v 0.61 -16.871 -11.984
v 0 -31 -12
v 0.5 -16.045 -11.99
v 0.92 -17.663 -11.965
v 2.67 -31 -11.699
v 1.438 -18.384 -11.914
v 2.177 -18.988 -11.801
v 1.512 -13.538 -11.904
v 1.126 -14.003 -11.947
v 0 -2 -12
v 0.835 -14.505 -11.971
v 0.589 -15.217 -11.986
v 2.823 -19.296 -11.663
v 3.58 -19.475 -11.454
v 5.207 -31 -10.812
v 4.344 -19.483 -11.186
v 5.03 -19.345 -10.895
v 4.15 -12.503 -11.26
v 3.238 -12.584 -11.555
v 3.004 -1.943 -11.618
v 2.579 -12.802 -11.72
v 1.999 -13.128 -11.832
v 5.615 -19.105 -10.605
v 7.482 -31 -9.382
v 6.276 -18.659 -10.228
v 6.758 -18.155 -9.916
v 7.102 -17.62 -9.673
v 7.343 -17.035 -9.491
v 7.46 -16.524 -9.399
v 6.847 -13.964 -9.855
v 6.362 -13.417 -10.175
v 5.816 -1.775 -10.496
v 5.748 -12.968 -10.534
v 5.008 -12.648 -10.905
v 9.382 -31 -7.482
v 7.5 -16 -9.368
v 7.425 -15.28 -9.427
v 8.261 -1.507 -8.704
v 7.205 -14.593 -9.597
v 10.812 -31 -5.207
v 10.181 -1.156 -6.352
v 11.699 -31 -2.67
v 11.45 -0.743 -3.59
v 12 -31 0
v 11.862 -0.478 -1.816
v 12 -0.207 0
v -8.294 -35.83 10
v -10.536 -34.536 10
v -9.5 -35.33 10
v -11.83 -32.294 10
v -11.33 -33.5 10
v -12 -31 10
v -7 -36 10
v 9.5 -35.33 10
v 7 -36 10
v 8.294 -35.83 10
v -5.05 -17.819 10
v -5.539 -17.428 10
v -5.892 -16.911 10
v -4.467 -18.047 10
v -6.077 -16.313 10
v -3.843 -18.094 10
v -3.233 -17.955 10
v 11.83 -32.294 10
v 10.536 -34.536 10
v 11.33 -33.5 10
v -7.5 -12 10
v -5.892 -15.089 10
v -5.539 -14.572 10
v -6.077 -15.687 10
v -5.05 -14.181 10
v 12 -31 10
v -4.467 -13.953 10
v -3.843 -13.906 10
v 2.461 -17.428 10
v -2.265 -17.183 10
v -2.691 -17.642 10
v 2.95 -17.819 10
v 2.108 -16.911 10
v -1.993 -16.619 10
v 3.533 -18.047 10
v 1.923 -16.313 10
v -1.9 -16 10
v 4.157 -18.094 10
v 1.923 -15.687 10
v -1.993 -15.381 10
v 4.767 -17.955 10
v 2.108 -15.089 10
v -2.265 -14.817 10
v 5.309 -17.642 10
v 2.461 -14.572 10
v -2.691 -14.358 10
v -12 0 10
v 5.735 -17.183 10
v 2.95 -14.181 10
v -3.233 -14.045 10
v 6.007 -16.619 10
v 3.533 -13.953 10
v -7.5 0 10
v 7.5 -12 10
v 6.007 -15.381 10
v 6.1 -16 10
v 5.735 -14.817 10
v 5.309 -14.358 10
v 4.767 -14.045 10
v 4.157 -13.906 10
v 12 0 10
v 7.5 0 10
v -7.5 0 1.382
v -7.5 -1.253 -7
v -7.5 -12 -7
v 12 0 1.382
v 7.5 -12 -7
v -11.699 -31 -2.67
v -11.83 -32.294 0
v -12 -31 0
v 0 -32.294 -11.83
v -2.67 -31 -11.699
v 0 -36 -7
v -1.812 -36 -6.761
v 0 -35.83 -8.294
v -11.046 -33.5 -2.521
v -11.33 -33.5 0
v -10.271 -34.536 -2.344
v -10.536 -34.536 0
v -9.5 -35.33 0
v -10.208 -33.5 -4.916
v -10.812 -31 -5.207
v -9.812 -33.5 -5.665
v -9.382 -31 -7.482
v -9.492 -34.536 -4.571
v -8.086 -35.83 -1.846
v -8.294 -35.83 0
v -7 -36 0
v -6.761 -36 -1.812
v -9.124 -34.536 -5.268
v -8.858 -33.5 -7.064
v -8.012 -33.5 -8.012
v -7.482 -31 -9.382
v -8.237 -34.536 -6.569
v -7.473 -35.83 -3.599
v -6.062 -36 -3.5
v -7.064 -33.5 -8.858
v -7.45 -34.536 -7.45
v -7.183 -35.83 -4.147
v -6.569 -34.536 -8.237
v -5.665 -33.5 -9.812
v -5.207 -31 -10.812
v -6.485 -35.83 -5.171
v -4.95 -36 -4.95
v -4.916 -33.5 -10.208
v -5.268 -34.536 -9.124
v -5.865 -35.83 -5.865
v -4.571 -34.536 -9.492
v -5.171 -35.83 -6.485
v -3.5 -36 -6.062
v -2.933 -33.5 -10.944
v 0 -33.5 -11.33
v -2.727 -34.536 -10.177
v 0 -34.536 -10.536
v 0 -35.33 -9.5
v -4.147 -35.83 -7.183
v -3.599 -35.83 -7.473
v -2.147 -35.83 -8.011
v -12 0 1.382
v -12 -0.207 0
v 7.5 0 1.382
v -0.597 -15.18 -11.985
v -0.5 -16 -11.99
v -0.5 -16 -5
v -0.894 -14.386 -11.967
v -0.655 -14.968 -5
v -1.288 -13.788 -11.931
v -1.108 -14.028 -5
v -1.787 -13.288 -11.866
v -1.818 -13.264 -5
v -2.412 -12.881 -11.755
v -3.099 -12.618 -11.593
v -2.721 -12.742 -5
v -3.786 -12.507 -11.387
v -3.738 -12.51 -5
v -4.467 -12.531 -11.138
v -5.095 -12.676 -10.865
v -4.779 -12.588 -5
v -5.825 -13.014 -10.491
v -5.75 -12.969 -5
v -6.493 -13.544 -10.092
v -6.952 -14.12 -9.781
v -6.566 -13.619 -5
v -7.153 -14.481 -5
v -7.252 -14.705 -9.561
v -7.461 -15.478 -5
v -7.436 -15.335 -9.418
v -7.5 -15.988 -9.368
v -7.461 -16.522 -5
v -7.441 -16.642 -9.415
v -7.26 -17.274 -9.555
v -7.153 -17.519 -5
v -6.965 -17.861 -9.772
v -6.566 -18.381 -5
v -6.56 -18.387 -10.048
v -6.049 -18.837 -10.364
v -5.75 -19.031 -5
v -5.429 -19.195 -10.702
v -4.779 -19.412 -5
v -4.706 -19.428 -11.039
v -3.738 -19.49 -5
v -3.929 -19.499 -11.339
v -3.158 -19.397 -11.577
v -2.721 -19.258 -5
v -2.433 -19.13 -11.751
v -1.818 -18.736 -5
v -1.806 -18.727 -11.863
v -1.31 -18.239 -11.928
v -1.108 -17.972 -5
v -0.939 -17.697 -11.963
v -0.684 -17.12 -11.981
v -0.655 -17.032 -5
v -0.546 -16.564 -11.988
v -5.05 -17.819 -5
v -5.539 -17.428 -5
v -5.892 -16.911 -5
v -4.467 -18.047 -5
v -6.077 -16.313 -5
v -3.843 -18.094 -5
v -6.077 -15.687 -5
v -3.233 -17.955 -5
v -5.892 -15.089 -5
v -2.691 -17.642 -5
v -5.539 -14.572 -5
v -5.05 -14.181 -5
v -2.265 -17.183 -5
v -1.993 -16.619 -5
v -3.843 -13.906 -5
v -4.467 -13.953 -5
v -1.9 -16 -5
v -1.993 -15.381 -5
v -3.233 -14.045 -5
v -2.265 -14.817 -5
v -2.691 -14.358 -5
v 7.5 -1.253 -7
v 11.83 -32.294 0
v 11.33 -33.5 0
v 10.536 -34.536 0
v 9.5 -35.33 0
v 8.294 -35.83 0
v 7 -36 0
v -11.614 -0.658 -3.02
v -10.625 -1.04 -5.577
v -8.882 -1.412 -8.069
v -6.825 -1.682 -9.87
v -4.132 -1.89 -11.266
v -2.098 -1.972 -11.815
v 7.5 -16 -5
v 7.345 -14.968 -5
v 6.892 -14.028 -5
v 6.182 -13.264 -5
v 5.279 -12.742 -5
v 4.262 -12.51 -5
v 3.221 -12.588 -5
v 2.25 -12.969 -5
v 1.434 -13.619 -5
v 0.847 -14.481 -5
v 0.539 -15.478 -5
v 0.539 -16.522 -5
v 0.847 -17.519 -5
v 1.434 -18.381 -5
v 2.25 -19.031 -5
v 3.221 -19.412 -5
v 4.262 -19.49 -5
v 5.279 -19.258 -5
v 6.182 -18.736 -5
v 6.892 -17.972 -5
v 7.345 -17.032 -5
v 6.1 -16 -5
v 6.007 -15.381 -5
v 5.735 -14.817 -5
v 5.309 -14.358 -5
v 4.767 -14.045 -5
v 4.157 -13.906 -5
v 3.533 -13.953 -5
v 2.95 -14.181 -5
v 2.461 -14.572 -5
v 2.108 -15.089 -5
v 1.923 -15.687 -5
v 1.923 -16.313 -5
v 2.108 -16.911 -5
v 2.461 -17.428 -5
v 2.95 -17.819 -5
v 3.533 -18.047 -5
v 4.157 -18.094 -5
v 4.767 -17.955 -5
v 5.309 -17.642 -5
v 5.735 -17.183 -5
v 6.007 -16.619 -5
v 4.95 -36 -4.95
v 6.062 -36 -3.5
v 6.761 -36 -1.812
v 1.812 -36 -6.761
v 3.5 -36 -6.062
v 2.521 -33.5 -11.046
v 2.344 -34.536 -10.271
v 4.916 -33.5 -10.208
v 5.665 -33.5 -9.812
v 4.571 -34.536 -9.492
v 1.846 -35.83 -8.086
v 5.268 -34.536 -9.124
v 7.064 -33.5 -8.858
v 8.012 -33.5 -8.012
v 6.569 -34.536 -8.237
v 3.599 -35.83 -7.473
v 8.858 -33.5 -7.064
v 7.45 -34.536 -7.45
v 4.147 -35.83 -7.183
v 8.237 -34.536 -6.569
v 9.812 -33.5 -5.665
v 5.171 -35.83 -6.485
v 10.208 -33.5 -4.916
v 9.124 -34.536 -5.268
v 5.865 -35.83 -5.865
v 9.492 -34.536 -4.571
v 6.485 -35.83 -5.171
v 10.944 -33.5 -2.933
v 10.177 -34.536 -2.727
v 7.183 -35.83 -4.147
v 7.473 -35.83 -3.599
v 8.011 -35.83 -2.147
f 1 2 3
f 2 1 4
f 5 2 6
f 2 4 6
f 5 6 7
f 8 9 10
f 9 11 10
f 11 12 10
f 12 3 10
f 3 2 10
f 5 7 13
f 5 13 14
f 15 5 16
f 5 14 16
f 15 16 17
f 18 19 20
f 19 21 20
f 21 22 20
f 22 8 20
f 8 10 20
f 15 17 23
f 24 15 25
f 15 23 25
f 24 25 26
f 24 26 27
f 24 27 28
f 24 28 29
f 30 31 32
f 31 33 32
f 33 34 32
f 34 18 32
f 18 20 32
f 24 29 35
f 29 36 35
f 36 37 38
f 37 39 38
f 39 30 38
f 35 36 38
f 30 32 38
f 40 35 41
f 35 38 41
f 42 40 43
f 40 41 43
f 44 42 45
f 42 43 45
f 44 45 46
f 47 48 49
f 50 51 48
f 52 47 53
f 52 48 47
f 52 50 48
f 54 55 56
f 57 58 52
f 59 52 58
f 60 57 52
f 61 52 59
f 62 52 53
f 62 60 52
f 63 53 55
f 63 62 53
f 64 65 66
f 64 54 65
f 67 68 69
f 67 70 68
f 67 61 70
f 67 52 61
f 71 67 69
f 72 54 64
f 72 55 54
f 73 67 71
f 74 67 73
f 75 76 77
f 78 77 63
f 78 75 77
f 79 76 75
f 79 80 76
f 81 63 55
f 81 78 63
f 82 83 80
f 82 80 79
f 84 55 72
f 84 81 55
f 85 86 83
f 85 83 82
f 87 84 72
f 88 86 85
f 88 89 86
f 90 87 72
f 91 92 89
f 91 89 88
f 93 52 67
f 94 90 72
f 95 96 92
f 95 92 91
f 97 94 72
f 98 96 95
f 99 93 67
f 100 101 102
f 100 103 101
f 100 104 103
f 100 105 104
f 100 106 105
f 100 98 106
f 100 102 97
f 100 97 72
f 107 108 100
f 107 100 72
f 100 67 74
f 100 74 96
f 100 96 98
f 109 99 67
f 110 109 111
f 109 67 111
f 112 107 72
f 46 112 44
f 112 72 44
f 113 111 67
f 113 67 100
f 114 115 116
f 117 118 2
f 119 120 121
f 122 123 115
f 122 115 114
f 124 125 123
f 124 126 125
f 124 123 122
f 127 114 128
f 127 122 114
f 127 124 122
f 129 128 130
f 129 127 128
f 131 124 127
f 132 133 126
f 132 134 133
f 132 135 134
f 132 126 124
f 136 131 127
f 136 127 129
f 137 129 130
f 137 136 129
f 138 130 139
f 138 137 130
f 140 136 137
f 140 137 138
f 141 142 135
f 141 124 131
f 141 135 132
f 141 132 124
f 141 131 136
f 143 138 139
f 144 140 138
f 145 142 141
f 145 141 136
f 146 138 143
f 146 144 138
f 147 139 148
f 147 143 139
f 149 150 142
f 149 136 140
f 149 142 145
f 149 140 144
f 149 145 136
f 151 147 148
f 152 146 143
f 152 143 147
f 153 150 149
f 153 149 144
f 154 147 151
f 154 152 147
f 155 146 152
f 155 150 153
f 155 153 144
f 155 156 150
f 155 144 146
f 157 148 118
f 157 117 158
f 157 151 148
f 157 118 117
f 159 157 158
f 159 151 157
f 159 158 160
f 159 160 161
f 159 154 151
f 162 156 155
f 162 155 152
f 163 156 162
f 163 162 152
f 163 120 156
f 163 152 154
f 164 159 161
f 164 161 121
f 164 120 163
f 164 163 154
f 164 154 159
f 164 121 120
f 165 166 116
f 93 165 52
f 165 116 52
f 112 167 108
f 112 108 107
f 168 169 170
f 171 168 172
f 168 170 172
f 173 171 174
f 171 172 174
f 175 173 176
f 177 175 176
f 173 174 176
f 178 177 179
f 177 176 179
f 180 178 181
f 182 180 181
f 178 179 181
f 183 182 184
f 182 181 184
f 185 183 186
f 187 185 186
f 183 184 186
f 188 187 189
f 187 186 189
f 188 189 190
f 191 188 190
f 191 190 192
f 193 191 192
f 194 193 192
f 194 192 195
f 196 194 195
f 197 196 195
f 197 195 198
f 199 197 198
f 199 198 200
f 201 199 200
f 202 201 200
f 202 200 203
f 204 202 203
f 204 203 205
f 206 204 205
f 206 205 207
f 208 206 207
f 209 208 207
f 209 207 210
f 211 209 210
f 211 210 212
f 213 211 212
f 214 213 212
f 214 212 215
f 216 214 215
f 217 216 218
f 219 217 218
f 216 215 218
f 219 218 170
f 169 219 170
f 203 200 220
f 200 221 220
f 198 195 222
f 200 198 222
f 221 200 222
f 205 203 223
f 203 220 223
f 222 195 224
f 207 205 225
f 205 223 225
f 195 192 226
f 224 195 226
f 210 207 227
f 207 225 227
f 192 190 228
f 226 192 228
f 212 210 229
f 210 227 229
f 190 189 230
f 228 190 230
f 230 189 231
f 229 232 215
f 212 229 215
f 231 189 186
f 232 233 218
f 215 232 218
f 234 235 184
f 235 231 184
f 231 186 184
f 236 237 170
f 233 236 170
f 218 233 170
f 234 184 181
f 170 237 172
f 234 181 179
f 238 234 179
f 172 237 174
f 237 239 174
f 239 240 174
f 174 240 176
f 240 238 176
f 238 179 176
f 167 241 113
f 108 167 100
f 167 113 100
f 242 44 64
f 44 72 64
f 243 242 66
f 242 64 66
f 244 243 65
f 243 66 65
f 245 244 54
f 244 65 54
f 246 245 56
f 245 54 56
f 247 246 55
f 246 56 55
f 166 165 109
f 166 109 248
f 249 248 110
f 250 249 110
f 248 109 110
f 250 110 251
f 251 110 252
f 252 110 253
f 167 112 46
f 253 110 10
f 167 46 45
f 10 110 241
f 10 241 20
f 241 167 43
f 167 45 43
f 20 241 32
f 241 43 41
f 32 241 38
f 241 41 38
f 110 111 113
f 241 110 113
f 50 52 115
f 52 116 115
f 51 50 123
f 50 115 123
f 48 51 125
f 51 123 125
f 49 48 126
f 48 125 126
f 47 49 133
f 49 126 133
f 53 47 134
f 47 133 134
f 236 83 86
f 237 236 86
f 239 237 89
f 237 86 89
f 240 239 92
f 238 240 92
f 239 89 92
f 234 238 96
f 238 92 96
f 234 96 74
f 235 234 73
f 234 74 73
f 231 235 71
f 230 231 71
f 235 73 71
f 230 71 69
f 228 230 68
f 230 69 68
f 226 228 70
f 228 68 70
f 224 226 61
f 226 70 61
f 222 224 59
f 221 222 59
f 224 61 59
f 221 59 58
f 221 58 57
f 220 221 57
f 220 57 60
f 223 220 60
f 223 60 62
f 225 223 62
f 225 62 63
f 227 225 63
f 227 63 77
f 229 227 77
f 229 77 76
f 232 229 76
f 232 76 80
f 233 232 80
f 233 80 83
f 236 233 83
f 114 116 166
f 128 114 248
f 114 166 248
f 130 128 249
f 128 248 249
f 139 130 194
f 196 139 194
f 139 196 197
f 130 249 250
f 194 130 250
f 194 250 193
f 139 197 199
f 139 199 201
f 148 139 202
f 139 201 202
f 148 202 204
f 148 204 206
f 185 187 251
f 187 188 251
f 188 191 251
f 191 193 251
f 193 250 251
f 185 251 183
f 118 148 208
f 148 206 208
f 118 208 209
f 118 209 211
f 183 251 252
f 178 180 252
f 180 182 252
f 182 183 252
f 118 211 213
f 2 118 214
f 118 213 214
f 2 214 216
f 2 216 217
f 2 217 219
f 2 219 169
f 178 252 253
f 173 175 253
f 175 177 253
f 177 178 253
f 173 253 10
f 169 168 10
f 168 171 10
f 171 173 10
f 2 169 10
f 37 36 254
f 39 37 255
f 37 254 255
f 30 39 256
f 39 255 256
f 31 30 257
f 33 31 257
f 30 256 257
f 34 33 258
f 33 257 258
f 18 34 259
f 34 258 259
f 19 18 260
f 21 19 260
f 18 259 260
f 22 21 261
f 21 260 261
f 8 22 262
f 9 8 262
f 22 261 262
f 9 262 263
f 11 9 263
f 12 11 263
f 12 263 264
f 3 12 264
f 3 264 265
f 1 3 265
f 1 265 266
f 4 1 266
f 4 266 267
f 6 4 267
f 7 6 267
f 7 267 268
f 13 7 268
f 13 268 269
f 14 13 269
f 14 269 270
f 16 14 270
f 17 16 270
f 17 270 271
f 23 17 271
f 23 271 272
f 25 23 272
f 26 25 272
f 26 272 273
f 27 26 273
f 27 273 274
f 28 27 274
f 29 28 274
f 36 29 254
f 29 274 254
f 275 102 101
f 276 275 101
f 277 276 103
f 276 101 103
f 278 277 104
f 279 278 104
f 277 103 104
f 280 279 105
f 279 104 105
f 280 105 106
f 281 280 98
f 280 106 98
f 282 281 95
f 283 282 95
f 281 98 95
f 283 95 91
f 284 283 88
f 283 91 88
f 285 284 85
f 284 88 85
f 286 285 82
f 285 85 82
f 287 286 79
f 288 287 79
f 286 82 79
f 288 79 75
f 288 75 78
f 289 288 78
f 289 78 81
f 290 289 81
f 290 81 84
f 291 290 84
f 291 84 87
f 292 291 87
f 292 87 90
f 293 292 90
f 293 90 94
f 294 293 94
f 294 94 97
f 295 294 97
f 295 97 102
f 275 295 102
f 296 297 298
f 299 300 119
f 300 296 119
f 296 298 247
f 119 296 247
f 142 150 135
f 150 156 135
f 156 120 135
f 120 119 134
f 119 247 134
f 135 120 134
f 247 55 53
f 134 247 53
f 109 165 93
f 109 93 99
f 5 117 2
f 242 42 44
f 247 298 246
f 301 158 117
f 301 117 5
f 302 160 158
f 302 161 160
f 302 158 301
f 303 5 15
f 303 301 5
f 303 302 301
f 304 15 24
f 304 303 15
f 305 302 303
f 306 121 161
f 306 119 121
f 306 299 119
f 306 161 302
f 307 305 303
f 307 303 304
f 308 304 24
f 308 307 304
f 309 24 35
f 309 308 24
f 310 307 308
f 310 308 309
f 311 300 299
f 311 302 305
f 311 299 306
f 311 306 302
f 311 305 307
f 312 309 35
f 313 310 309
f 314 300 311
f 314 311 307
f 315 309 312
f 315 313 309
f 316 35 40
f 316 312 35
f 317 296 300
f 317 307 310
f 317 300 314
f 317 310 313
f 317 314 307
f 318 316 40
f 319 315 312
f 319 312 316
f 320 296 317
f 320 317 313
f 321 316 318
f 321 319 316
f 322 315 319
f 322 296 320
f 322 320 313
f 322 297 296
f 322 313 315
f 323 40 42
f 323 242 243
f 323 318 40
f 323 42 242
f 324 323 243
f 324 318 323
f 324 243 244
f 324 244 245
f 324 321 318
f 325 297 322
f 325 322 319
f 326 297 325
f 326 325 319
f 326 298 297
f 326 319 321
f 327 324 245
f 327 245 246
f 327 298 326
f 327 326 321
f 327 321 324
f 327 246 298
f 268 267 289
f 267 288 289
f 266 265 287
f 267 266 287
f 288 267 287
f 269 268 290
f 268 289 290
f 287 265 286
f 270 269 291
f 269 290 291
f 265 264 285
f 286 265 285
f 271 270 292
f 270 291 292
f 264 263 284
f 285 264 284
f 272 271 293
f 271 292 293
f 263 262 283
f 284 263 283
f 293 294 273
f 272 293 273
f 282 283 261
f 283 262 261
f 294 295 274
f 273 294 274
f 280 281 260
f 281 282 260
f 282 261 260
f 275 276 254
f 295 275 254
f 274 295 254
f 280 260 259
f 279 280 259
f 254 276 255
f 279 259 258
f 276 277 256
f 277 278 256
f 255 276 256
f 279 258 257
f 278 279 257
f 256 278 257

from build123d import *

# Parameters (mm, degrees)
EXTRUDE_1_DEPTH     = 10
SKETCH_2_W          = 24
SKETCH_2_H          = 25
EXTRUDE_2_DEPTH     = 12
EXTRUDE_3_DEPTH     = 11
CUT_EXTRUDE_1_DEPTH = 15
SKETCH_5_W          = 15
SKETCH_5_H          = 17
CUT_EXTRUDE_2_DEPTH = 1
FILLET_2_R          = 12
FILLET_3_R          = 5
SKETCH_6_R          = 2.1
CUT_EXTRUDE_3_DEPTH = 30
CUT_EXTRUDE_START   = -15
SKETCH_7_R          = 3.5
CUT_EXTRUDE_4_DEPTH = 10


with BuildPart() as part:
    # 草图1 → 凸台-拉伸1 (new body)
    with BuildSketch(Plane.XY):
        Polygon((-7.5, 0), (-12, 0), (-12, -36), (12, -36), (12, 0), (7.5, 0), (7.5, -11), (-7.5, -11), align=None)
    extrude(amount=EXTRUDE_1_DEPTH)

    # 草图2 → 凸台-拉伸2 (add)
    with BuildSketch(Plane(origin=(0, 0, 0), x_dir=(-1, 0, 0), z_dir=(0, 0, -1))):
        with Locations((0, -23.5)):
            Rectangle(SKETCH_2_W, SKETCH_2_H)
    extrude(amount=EXTRUDE_2_DEPTH)

    # 草图3 → 凸台-拉伸3 (add)
    with BuildSketch(Plane(origin=(0, -11, 0), x_dir=(1, 0, 0), z_dir=(0, 1, 0))):
        Polygon((-7.5, 0), (-7.5, 7), (7.5, 7), (7.5, 0), (12, 0), (12, 12), (-12, 12), (-12, 0), align=None)
    extrude(amount=EXTRUDE_3_DEPTH)

    # 草图4 → 切除-拉伸1 (cut, symmetric)
    with BuildSketch(Plane(origin=(0, 0, 0), x_dir=(0, 0, -1), z_dir=(1, 0, 0))):
        Polygon((-1.382312477, 0), (12, -2), (12, 0), align=None)
    extrude(amount=CUT_EXTRUDE_1_DEPTH, both=True, mode=Mode.SUBTRACT)

    # 草图5 → 切除-拉伸2 (cut)
    with BuildSketch(Plane(origin=(0, -11, 0), x_dir=(1, 0, 0), z_dir=(0, 1, 0))):
        with Locations((0, -1.5)):
            Rectangle(SKETCH_5_W, SKETCH_5_H)
    extrude(amount=-CUT_EXTRUDE_2_DEPTH, mode=Mode.SUBTRACT)

    # 圆角2
    fillet_2_edges = [part.edges().sort_by_distance(p)[0] for p in [
        (12, -19, -12),
        (-12, -19, -12),
    ]]
    fillet(fillet_2_edges, radius=FILLET_2_R - 0.0001)  # a hair under: the kernel refuses the full size

    # 圆角3
    fillet_3_edges = [part.edges().sort_by_distance(p)[0] for p in [
        (8.485310664, -36, -8.485310664),
        (-8.485310664, -36, -8.485310664),
        (12, -36, 4.99995),
        (-12, -36, 4.99995),
    ]]
    fillet(fillet_3_edges, radius=FILLET_3_R)

    # 草图6 → 切除-拉伸3 (cut)
    with BuildSketch(Plane.XY.offset(10)):
        with Locations((4, -16)):
            Circle(SKETCH_6_R)
        with Locations((-4, -16)):
            Circle(SKETCH_6_R)
    extrude(amount=-CUT_EXTRUDE_3_DEPTH, mode=Mode.SUBTRACT)

    # 草图7 → 切除-拉伸4 (cut)
    with BuildSketch(Plane.XY.offset(10).offset(CUT_EXTRUDE_START)):
        with Locations((4, -16)):
            Circle(SKETCH_7_R)
        with Locations((-4, -16)):
            Circle(SKETCH_7_R)
    extrude(amount=-CUT_EXTRUDE_4_DEPTH, mode=Mode.SUBTRACT)


solid = part.part
